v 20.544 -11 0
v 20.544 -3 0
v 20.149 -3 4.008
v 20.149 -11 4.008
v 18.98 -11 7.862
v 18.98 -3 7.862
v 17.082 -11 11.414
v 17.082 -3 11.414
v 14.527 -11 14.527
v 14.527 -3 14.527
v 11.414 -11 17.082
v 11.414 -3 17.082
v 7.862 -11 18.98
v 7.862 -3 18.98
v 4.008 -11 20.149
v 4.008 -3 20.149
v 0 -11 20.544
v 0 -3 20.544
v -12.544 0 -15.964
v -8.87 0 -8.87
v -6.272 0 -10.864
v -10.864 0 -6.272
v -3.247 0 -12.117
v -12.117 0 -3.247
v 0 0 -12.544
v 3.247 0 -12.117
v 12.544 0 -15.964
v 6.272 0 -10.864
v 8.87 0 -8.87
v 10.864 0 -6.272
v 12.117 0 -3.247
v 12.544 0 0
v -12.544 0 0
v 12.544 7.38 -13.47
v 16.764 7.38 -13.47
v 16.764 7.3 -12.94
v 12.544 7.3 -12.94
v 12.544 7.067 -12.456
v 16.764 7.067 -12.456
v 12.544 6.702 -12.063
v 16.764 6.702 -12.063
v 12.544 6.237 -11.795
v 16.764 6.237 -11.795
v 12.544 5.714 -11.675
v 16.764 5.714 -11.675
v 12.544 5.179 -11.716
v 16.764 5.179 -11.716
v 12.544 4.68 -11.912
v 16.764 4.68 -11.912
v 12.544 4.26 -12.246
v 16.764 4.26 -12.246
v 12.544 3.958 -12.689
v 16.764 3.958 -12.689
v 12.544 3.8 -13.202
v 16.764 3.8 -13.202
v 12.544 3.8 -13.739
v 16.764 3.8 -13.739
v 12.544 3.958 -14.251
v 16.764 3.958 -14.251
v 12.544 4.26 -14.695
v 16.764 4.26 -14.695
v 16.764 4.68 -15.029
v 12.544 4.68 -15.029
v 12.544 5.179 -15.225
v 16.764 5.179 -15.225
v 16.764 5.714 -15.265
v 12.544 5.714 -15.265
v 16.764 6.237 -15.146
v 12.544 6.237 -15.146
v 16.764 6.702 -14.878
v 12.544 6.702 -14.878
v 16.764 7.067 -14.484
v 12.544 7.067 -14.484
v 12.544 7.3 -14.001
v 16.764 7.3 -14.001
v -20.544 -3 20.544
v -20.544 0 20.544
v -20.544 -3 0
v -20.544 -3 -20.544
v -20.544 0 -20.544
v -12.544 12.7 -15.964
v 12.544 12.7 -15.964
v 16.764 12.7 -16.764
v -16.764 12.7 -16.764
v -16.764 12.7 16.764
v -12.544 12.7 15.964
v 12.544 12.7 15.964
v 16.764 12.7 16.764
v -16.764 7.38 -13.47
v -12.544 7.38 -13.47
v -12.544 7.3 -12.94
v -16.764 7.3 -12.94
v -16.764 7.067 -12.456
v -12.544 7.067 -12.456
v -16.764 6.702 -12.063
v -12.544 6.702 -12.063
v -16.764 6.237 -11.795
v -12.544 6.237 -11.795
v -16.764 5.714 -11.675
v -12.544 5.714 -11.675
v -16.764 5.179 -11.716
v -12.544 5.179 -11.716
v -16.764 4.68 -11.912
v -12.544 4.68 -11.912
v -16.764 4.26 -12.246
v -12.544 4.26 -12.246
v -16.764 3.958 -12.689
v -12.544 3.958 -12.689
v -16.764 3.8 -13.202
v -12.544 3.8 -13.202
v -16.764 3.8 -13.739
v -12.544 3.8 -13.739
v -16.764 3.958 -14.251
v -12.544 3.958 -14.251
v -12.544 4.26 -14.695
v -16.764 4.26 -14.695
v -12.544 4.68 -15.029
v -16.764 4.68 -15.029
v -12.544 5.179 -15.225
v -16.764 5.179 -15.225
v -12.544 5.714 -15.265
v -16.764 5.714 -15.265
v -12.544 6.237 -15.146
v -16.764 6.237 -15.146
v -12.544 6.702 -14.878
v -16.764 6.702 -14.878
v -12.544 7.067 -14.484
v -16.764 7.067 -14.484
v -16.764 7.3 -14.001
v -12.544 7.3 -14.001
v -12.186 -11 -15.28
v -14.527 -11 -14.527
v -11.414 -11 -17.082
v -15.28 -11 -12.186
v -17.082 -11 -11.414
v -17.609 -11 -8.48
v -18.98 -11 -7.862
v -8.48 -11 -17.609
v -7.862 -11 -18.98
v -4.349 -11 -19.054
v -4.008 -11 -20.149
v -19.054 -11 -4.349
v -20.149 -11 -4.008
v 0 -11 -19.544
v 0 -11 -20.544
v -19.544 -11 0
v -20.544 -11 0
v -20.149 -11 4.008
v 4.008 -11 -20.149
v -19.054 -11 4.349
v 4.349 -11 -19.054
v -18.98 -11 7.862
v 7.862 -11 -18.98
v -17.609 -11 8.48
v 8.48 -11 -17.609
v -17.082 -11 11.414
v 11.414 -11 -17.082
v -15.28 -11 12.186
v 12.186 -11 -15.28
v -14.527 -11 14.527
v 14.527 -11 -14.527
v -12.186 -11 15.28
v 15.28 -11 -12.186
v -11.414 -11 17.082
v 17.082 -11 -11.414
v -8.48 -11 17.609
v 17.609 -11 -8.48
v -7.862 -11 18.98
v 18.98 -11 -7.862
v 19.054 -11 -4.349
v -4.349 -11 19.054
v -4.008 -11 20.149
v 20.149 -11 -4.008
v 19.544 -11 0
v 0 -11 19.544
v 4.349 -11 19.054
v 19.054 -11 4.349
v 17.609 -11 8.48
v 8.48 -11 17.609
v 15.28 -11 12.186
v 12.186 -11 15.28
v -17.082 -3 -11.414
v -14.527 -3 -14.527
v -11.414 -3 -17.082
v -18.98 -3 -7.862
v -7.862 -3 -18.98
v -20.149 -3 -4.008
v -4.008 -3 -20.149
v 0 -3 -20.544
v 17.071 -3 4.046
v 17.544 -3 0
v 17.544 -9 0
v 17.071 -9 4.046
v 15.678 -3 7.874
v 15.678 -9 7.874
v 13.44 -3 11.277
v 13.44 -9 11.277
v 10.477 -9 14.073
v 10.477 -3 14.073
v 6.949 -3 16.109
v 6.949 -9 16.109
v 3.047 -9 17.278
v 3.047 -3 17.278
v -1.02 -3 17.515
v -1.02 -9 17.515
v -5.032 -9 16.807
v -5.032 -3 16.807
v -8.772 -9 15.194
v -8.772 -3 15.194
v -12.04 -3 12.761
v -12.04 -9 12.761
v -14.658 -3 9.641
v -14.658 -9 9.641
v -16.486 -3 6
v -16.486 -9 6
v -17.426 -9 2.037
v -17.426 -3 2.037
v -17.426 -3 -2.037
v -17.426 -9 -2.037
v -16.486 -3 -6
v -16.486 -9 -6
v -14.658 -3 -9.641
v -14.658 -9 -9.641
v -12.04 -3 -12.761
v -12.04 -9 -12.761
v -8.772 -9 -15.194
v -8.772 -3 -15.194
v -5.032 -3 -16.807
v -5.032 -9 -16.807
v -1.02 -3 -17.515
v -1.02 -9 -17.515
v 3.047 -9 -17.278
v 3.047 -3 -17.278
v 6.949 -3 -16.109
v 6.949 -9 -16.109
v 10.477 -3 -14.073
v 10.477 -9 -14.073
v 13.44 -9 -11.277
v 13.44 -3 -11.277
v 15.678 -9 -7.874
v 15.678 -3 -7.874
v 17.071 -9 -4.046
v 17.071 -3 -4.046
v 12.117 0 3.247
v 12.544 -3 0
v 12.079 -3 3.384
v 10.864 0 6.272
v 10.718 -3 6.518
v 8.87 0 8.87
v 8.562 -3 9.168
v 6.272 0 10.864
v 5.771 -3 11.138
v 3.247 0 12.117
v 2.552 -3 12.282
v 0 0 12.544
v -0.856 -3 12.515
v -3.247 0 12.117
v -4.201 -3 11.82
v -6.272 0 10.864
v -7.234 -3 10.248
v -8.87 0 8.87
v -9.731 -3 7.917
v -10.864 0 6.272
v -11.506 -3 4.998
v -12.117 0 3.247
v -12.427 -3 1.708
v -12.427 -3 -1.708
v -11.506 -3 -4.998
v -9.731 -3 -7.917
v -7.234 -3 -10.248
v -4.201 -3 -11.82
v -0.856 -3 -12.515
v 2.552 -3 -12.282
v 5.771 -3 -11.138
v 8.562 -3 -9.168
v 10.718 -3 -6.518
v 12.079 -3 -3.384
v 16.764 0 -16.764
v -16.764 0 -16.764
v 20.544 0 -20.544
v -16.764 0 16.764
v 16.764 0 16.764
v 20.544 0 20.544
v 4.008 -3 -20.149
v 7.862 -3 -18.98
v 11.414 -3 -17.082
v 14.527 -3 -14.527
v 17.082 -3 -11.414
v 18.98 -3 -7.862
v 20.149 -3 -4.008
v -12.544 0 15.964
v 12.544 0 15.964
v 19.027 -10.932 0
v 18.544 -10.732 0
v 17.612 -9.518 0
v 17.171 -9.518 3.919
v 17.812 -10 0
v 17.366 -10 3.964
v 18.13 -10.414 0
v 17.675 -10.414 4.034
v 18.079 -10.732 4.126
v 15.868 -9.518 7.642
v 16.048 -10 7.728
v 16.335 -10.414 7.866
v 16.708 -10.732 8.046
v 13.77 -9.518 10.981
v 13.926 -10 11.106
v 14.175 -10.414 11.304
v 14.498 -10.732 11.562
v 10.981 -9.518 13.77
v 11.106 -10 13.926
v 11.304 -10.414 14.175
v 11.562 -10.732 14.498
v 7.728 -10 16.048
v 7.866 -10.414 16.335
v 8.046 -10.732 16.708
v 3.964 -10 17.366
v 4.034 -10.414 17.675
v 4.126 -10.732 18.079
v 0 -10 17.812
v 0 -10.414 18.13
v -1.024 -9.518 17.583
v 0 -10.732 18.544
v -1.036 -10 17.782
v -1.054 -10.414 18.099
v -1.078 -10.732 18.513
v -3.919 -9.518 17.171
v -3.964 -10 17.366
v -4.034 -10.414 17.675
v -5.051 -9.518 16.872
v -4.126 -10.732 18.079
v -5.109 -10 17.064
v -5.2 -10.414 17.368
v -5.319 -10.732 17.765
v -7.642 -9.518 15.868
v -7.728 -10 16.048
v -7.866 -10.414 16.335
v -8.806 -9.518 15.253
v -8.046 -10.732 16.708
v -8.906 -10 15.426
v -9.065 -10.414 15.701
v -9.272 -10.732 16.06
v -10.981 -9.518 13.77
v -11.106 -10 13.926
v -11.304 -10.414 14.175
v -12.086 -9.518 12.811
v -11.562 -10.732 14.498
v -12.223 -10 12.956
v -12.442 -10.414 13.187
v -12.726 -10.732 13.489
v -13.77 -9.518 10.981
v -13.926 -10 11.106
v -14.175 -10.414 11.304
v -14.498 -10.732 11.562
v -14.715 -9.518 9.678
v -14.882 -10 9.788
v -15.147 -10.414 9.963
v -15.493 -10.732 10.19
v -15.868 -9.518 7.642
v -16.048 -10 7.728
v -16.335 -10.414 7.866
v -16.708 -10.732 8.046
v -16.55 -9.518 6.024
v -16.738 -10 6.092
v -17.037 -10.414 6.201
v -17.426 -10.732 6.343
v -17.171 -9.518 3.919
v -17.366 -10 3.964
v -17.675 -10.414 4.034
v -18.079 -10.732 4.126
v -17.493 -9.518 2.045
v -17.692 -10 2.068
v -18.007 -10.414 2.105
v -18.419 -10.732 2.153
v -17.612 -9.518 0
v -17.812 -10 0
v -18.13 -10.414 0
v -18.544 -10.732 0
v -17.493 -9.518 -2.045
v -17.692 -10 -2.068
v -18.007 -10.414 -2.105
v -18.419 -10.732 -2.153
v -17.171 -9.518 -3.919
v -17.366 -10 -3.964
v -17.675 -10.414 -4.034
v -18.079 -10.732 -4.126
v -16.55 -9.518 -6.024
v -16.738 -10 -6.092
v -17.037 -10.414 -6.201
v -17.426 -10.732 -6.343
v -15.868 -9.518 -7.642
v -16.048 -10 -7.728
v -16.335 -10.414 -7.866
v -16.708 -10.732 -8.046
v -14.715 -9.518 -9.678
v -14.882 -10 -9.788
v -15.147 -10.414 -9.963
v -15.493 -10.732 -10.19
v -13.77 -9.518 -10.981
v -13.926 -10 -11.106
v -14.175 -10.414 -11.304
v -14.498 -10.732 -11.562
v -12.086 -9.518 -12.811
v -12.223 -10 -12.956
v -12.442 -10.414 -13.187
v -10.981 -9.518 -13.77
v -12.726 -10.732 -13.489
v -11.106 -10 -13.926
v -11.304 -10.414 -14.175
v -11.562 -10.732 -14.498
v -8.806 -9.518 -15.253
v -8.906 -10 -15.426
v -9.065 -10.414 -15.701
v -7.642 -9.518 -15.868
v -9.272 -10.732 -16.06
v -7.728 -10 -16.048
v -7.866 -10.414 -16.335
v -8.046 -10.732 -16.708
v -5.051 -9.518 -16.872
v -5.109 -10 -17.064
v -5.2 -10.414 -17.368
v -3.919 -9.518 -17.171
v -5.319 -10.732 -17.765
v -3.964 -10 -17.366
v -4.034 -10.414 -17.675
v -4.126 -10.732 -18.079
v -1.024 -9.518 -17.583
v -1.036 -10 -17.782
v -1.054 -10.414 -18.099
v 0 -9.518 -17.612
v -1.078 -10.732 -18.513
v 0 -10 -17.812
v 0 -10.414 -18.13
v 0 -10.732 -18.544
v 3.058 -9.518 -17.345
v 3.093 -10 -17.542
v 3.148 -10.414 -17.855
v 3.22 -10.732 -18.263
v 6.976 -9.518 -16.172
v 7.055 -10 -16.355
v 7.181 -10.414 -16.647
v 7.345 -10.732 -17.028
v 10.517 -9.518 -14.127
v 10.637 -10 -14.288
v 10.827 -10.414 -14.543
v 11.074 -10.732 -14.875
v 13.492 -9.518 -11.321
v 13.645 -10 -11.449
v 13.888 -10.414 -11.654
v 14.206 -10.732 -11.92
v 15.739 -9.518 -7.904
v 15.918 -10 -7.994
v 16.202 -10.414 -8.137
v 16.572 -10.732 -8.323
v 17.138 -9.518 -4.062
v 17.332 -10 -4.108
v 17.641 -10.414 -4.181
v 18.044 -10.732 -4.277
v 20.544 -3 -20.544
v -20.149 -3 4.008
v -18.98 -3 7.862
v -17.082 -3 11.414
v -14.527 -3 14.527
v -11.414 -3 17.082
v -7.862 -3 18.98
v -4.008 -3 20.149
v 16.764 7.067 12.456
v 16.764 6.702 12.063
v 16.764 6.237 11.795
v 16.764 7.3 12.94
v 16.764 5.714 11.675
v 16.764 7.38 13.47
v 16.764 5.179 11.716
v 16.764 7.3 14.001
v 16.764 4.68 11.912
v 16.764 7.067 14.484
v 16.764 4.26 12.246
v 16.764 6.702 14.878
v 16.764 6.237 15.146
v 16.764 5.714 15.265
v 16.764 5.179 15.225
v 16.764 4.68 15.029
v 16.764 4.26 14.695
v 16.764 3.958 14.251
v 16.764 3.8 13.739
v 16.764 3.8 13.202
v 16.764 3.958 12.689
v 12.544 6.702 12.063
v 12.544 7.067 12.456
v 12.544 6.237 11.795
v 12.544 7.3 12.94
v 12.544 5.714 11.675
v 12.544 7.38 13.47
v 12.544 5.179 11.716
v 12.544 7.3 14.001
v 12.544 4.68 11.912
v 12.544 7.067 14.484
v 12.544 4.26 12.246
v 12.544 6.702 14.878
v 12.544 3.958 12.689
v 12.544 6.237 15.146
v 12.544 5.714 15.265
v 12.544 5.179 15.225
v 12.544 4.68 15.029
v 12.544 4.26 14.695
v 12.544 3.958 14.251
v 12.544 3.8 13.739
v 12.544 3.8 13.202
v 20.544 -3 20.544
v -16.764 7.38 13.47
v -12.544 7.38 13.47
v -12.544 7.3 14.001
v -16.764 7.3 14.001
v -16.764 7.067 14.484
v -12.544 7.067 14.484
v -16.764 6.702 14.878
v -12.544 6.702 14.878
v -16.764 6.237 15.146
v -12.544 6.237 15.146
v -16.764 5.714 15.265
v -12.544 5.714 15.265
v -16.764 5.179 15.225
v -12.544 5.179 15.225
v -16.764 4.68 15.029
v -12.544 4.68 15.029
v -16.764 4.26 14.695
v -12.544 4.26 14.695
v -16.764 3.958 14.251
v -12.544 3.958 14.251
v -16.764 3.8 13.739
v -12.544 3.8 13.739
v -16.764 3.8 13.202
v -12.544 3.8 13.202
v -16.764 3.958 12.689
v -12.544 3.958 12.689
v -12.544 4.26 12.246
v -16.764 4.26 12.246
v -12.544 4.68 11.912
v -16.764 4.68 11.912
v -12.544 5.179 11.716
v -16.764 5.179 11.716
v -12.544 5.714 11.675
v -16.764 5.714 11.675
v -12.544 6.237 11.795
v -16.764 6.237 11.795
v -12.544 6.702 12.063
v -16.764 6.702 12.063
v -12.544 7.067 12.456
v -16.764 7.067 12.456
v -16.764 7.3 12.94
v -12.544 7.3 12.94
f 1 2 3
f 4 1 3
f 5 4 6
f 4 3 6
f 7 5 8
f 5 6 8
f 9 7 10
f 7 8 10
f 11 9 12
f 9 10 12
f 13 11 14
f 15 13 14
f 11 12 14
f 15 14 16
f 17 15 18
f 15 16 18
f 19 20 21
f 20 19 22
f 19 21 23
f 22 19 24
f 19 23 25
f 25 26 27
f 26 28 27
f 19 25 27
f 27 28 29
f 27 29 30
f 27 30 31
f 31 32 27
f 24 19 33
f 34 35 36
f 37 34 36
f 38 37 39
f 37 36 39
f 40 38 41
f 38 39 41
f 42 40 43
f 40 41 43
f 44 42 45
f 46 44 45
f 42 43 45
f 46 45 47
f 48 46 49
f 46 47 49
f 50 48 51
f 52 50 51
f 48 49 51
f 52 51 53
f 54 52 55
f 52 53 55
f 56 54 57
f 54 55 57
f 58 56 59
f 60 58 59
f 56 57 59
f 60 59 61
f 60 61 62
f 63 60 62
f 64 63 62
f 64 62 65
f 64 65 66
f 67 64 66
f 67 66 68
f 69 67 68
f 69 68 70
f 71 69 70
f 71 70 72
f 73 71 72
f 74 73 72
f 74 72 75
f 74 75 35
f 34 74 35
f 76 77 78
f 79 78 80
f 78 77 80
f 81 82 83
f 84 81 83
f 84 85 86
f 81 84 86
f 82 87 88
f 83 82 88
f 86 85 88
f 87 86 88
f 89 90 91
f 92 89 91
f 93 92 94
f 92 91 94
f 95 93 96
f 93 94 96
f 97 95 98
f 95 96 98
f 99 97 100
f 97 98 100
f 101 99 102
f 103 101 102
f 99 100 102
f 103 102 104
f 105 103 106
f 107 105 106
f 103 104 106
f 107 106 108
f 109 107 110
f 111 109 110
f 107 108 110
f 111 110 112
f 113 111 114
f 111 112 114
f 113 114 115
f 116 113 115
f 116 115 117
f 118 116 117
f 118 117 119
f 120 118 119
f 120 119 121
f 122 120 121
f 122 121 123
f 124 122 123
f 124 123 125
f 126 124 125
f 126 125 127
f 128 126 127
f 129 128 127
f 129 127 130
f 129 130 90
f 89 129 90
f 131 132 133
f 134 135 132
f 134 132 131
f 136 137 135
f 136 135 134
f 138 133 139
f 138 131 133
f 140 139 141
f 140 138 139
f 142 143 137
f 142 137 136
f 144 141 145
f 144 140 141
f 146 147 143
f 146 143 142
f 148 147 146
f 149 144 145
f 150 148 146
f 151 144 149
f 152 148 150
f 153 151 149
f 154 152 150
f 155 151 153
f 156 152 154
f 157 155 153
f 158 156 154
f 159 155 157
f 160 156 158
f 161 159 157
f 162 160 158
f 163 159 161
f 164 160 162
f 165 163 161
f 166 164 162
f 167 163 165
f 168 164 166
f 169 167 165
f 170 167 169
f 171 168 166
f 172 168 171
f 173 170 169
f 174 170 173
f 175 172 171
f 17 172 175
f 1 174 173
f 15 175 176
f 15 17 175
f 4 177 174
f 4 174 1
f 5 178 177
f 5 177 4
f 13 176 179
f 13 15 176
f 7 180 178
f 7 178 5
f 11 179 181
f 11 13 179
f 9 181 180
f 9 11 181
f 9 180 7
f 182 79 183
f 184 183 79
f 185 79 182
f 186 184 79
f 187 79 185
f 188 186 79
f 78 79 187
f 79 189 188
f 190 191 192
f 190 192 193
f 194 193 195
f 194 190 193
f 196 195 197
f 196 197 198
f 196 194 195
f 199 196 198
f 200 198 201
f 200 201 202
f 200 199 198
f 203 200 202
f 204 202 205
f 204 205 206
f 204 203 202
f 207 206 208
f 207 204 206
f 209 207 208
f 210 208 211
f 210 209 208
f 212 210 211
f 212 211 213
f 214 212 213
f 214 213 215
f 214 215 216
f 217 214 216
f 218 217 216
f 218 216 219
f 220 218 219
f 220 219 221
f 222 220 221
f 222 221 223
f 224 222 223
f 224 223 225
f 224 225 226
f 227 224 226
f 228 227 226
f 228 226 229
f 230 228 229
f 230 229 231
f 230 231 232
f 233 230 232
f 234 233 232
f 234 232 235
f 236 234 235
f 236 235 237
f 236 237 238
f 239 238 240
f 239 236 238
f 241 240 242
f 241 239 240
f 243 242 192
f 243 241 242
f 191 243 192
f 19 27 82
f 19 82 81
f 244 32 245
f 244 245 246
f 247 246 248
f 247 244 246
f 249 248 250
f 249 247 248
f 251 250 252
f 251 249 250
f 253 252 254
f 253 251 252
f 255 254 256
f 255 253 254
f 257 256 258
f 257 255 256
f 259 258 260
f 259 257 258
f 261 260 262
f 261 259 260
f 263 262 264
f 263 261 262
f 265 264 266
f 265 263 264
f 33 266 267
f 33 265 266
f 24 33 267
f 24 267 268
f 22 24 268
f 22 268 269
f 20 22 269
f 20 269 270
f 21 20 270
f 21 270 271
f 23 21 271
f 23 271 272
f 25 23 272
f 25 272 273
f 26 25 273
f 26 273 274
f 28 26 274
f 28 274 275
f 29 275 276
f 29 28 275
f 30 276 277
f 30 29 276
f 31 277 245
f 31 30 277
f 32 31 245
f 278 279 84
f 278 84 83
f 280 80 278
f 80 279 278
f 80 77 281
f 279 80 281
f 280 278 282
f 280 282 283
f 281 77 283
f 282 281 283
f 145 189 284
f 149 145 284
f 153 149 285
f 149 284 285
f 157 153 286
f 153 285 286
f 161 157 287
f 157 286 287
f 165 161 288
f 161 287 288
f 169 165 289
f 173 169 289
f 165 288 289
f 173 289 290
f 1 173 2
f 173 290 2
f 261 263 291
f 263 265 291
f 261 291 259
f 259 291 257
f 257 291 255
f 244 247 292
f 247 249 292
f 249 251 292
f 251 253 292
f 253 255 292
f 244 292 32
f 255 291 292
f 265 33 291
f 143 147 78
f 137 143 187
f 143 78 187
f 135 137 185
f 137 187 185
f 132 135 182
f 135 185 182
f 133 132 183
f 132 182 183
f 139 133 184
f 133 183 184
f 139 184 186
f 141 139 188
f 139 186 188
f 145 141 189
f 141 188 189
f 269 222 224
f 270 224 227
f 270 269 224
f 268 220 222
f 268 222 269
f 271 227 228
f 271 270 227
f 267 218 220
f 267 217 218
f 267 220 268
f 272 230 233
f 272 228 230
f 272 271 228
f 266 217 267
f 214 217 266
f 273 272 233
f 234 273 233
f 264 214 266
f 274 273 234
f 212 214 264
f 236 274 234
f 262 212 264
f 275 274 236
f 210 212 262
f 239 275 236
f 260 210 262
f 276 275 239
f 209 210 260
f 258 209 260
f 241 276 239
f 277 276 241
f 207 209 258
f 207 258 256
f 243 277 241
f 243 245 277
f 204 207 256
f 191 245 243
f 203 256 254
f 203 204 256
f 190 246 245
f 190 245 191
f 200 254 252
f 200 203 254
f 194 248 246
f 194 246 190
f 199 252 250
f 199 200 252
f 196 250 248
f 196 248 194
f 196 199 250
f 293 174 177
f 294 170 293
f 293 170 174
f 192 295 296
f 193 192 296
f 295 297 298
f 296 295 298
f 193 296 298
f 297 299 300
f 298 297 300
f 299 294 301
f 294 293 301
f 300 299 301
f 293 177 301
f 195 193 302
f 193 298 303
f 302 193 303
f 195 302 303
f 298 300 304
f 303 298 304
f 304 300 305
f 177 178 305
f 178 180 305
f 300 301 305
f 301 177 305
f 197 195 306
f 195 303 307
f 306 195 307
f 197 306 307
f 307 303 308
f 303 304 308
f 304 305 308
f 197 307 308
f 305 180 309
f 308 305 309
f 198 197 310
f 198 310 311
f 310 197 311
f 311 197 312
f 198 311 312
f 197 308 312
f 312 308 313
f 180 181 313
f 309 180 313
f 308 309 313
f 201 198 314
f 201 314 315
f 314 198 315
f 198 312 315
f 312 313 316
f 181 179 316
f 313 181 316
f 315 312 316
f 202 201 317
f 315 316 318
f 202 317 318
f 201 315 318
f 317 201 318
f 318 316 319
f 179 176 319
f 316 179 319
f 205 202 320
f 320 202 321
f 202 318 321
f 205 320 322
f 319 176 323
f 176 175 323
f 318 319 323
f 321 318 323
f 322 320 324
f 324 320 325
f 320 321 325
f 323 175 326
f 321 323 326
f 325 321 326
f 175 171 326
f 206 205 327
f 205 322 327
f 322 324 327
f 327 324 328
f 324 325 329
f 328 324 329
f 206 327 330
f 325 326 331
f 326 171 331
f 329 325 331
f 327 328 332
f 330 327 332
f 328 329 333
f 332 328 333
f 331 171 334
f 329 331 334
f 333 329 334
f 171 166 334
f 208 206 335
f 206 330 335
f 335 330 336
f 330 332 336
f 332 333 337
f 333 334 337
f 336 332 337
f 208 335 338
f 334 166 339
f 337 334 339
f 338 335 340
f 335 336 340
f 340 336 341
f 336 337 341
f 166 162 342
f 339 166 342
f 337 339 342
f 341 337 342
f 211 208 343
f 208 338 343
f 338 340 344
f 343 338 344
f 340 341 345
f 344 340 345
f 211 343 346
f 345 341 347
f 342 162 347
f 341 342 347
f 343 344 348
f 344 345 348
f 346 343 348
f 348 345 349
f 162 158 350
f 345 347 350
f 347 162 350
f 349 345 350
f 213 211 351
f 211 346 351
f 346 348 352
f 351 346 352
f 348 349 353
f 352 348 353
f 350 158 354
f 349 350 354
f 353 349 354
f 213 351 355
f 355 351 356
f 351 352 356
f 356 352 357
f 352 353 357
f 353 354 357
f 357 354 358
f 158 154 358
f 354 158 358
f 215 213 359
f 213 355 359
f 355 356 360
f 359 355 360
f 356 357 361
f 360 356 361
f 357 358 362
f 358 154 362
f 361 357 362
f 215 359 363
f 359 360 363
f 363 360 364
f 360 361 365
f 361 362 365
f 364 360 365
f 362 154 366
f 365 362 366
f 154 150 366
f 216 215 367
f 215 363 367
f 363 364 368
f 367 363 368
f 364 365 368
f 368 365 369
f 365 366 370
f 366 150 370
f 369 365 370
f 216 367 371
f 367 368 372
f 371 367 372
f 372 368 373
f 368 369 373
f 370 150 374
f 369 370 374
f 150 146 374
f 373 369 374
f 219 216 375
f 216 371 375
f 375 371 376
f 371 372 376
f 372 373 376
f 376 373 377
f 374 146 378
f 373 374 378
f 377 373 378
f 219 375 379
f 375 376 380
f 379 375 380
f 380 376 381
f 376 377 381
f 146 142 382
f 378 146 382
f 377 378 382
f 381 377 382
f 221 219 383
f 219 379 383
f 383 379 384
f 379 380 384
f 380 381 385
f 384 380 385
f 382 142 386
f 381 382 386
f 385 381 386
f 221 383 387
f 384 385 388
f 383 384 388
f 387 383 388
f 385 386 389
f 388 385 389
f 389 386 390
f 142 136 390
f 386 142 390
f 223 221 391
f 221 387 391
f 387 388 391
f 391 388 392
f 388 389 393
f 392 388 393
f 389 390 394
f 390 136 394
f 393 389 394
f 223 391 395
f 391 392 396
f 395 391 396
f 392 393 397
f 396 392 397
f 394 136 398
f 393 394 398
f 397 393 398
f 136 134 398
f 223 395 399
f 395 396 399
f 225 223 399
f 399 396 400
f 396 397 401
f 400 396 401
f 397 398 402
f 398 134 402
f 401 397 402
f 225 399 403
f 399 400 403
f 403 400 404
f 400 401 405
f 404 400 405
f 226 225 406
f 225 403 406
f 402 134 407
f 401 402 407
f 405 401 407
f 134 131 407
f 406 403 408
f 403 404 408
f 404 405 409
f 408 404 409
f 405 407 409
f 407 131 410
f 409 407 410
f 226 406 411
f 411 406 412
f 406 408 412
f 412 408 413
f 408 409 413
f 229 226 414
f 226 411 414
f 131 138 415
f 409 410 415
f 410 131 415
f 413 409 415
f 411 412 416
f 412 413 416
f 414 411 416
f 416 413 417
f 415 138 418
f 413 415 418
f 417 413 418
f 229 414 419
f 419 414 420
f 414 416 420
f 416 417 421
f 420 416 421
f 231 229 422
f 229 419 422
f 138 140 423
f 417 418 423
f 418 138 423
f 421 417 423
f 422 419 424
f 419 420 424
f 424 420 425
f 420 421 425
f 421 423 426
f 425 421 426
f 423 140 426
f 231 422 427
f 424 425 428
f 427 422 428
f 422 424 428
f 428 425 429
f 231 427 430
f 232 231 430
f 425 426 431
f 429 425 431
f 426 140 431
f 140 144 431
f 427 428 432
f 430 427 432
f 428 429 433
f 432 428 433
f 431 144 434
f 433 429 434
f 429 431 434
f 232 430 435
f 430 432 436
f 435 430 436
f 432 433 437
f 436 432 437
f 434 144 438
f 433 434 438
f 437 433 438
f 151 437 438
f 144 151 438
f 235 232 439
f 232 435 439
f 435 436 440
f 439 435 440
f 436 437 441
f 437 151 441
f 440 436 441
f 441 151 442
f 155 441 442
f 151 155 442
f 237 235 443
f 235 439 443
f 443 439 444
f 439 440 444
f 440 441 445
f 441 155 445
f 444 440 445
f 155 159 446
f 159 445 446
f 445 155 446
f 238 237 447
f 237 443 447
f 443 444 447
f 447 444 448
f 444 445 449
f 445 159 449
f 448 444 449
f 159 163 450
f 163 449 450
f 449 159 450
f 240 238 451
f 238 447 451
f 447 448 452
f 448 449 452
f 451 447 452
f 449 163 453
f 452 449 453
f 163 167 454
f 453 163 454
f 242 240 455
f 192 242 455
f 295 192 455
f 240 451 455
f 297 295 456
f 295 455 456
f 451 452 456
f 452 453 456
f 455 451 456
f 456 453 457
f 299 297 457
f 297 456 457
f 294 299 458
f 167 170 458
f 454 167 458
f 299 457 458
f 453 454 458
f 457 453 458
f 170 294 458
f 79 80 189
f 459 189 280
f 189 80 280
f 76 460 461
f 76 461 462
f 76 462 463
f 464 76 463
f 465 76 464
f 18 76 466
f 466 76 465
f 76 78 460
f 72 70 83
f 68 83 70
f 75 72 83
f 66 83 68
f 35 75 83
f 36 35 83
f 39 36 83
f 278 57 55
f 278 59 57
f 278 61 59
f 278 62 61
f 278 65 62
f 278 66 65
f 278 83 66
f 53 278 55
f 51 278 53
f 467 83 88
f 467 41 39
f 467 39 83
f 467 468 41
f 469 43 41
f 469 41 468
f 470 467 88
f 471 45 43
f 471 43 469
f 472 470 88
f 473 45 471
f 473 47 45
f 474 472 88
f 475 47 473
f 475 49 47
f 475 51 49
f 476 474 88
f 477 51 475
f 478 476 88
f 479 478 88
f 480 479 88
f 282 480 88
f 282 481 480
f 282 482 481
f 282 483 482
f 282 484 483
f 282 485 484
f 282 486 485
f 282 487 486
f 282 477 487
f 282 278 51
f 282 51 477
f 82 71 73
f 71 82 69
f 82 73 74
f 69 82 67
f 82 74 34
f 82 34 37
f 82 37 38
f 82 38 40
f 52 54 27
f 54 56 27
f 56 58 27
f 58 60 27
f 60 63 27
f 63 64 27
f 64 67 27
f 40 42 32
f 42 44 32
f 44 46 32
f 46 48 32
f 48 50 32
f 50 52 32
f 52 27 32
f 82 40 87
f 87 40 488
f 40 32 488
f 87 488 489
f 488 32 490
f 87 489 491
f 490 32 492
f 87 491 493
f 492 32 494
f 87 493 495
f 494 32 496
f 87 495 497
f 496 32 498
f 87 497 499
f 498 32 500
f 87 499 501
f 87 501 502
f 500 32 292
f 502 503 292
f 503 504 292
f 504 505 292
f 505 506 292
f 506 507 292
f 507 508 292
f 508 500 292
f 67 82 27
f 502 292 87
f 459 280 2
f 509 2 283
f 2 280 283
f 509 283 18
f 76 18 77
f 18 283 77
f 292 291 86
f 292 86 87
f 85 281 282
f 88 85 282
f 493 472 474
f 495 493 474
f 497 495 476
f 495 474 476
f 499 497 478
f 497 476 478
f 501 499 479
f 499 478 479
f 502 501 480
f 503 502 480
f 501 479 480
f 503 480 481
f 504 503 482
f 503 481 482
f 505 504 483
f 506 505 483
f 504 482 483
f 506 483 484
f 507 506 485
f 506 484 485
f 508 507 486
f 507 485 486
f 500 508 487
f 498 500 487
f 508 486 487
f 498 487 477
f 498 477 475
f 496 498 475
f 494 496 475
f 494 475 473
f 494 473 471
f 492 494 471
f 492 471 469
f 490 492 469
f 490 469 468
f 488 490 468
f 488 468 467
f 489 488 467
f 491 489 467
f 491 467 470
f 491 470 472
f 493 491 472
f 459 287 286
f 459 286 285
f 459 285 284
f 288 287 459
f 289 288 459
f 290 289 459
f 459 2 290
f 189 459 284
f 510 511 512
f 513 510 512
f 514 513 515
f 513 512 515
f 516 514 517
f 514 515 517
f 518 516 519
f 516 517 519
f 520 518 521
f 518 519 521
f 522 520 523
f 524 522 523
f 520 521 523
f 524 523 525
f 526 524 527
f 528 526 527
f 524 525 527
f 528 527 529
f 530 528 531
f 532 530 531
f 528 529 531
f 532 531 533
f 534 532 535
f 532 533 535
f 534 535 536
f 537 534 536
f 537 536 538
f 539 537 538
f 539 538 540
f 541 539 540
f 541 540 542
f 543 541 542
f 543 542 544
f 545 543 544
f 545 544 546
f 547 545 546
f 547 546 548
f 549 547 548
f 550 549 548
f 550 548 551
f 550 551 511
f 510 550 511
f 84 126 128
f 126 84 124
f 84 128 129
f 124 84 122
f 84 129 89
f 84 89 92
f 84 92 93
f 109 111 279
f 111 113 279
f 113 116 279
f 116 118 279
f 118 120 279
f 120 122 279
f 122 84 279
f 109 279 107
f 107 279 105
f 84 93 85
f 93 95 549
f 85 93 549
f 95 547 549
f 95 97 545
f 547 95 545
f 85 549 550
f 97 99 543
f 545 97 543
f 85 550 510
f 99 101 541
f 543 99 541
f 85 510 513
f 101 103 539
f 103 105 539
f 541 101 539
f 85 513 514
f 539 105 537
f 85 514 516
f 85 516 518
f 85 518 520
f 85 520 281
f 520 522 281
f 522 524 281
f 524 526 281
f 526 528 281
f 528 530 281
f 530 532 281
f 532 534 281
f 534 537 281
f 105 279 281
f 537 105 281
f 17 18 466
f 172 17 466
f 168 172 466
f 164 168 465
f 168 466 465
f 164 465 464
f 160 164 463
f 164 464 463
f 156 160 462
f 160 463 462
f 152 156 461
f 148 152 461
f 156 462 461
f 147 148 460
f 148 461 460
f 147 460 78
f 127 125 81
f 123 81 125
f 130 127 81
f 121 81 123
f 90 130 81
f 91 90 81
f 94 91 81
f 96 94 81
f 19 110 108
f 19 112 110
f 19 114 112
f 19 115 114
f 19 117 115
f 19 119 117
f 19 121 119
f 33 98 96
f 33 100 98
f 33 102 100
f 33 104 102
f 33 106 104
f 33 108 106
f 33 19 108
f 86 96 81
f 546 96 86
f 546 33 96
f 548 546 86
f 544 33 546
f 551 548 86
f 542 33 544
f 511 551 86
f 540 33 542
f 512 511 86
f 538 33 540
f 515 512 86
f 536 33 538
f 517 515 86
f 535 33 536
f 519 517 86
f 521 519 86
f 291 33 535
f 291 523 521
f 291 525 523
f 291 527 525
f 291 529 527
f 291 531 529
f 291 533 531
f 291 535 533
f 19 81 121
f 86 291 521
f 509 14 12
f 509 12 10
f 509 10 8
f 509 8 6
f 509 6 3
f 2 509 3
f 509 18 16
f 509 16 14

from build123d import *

# Parameters (mm, degrees)
F0_R     = 17.54425
F1_DEPTH = 3
F0_R_2   = 12.54425
F2_DEPTH = 3
F3_DEPTH = 11
F4_R     = 2
F5_W     = 33.528
F5_H     = 33.528
F5_W_2   = 3.41975
F5_H_2   = 31.928
F6_DEPTH = 12.7
F7_R     = 1.8
F8_DEPTH = 37.30925


with BuildPart() as f1:
    # F0 (on Front) → F1 (new body)
    with BuildSketch(Plane.XZ):
        with BuildLine():
            ThreePointArc((20.54425, 0), (14.5269784894, 14.5269784894), (0, 20.54425))
            ThreePointArc((0, 20.54425), (-14.5269785029, 14.5269784759), (-20.54425, -3.82e-08))
            ThreePointArc((-20.54425, -3.82e-08), (-14.5269784759, -14.5269785029), (0, -20.54425))
            ThreePointArc((0, -20.54425), (14.5269784894, -14.5269784894), (20.54425, 0))
        make_face()
        Circle(F0_R, mode=Mode.SUBTRACT)
        with BuildLine():
            Line((20.54425, 20.54425), (0, 20.54425))
            ThreePointArc((0, 20.54425), (14.5269784894, 14.5269784894), (20.54425, 0))
            Line((20.54425, 0), (20.54425, 20.54425))
        make_face()
        with BuildLine():
            Line((20.54425, -20.54425), (20.54425, 0))
            ThreePointArc((20.54425, 0), (14.5269784894, -14.5269784894), (0, -20.54425))
            Line((0, -20.54425), (20.54425, -20.54425))
        make_face()
        with BuildLine():
            Line((0, 20.54425), (-20.54425, 20.54425))
            Line((-20.54425, 20.54425), (-20.54425, -3.82e-08))
            ThreePointArc((-20.54425, -3.82e-08), (-14.5269785029, 14.5269784759), (0, 20.54425))
        make_face()
        with BuildLine():
            ThreePointArc((0, -20.54425), (-14.5269784759, -14.5269785029), (-20.54425, -3.82e-08))
            Line((-20.54425, -3.82e-08), (-20.54425, -20.54425))
            Line((-20.54425, -20.54425), (0, -20.54425))
        make_face()
    extrude(amount=F1_DEPTH)

    # F0 (on Front) → F2 (join)
    with BuildSketch(Plane.XZ):
        Circle(F0_R)
        Circle(F0_R_2, mode=Mode.SUBTRACT)
    extrude(amount=F2_DEPTH)

    # F0 (on Front) → F3 (join)
    with BuildSketch(Plane.XZ):
        with BuildLine():
            ThreePointArc((20.54425, 0), (14.5269784894, 14.5269784894), (0, 20.54425))
            ThreePointArc((0, 20.54425), (-14.5269785029, 14.5269784759), (-20.54425, -3.82e-08))
            ThreePointArc((-20.54425, -3.82e-08), (-14.5269784759, -14.5269785029), (0, -20.54425))
            ThreePointArc((0, -20.54425), (14.5269784894, -14.5269784894), (20.54425, 0))
        make_face()
        Circle(F0_R, mode=Mode.SUBTRACT)
    extrude(amount=F3_DEPTH)

    # F4
    f4_edges = [f1.edges().sort_by_distance(p)[0] for p in [
        (-17.54425, -11, 0),
    ]]
    fillet(f4_edges, radius=F4_R)

    # F5 (on Front) → F6 (join)
    with BuildSketch(Plane.XZ):
        Rectangle(F5_W, F5_H)
        Polygon((12.54425, 15.964), (15.964, 15.964), (15.964, -15.964), (12.54425, -15.964), (-12.54425, -15.964), (-15.964, -15.964), (-15.964, 15.964), (-12.54425, 15.964), align=None, mode=Mode.SUBTRACT)
        with Locations((14.254125, 0)):
            Rectangle(F5_W_2, F5_H_2)
        with Locations((-14.254125, 0)):
            Rectangle(F5_W_2, F5_H_2)
    extrude(amount=-F6_DEPTH)

    # F7 (on face) → F8 (cut, through all)
    with BuildSketch(Plane.YZ.offset(16.764)):
        with Locations((5.5796158184, 13.4703841816)):
            Circle(F7_R)
        with Locations((5.5796158184, -13.4703841816)):
            Circle(F7_R)
    extrude(amount=-F8_DEPTH, mode=Mode.SUBTRACT)


solid = f1.part
